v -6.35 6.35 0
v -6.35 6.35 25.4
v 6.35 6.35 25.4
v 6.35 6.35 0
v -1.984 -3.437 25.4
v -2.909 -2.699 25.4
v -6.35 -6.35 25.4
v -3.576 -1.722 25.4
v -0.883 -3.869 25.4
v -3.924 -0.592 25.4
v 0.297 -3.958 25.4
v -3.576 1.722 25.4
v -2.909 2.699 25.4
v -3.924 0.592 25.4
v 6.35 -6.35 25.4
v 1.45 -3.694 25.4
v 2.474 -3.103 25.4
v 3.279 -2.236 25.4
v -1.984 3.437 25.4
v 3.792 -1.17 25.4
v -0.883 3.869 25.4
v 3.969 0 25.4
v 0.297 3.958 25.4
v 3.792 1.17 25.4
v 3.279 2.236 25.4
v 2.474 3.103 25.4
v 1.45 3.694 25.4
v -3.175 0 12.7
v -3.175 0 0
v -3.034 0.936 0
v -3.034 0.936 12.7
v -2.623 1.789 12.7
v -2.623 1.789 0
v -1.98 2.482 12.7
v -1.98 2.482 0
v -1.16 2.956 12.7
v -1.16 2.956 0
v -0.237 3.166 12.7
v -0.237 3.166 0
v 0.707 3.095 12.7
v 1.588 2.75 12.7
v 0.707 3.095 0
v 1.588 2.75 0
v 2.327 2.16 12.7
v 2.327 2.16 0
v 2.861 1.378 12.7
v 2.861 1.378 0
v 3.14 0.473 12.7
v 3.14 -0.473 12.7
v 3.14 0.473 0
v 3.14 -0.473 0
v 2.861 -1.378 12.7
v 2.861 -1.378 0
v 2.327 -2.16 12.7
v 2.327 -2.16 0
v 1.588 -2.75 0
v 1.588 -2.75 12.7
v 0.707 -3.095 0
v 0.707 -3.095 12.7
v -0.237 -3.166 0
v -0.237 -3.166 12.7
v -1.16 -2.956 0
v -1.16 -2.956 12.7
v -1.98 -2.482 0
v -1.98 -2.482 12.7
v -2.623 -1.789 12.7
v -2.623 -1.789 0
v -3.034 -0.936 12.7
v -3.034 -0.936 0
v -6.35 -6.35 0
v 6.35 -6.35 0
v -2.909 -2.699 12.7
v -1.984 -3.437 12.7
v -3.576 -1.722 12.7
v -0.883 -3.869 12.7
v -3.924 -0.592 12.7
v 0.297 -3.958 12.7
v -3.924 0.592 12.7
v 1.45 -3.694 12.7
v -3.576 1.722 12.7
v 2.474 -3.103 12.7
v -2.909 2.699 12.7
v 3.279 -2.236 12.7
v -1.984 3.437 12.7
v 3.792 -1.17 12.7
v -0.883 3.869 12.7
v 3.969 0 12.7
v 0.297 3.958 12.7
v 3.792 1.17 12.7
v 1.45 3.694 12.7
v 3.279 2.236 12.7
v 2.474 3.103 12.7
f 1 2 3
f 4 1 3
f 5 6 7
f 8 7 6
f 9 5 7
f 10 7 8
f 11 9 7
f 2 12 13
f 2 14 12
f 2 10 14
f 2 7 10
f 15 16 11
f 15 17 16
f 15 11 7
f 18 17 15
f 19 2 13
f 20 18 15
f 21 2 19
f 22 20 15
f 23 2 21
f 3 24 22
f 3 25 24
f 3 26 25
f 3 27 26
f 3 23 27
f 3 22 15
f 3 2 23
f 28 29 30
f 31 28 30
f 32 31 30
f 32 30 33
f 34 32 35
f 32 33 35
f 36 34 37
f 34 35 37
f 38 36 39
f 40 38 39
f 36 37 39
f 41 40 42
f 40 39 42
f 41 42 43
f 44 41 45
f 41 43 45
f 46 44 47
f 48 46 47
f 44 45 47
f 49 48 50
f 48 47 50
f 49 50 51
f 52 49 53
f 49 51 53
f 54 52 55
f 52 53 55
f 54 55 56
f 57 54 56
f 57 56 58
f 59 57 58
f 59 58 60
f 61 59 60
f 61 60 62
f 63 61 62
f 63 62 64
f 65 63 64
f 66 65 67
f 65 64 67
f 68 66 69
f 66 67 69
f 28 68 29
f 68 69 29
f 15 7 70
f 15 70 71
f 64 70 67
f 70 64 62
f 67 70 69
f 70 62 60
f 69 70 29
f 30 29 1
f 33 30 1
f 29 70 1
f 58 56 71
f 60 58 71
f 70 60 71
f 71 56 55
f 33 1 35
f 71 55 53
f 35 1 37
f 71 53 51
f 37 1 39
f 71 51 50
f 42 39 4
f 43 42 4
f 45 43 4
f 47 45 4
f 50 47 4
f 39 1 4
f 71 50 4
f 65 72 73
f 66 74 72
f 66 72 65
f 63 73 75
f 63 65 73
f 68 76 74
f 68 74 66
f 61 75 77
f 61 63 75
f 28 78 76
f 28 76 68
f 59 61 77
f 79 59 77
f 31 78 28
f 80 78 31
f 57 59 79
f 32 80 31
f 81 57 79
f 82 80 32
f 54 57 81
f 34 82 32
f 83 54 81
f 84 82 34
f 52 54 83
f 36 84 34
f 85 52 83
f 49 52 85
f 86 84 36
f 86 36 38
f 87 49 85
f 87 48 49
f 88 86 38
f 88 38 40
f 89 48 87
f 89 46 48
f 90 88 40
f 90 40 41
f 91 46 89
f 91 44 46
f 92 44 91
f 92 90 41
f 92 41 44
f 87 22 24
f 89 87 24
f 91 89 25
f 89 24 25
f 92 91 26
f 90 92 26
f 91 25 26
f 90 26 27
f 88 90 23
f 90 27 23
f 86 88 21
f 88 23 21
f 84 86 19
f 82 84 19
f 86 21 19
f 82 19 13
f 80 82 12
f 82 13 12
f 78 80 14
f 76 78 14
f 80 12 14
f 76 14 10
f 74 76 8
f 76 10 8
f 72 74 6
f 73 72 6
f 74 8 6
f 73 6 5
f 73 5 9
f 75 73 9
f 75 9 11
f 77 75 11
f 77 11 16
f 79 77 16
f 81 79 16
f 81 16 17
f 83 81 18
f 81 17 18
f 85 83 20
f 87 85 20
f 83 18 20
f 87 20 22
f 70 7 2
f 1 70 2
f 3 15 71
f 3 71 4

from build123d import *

# Parameters (mm, degrees)
SKETCH1_W           = 12.7
SKETCH1_H           = 12.7
BOSS_EXTRUDE1_DEPTH = 25.4
SKETCH2_R           = 3.175
CUT_EXTRUDE1_DEPTH  = 12.7
SKETCH3_R           = 3.96875
CUT_EXTRUDE2_DEPTH  = 12.7


with BuildPart() as part:
    # Sketch1 → Boss-Extrude1 (new body)
    with BuildSketch(Plane.XY):
        Rectangle(SKETCH1_W, SKETCH1_H)
    extrude(amount=BOSS_EXTRUDE1_DEPTH)

    # Sketch2 → Cut-Extrude1 (cut)
    with BuildSketch(Plane(origin=(0, 0, 0), x_dir=(-1, 0, 0), z_dir=(0, 0, -1))):
        Circle(SKETCH2_R)
    extrude(amount=-CUT_EXTRUDE1_DEPTH, mode=Mode.SUBTRACT)

    # Sketch3 → Cut-Extrude2 (cut)
    with BuildSketch(Plane.XY.offset(25.4)):
        Circle(SKETCH3_R)
    extrude(amount=-CUT_EXTRUDE2_DEPTH, mode=Mode.SUBTRACT)


solid = part.part
